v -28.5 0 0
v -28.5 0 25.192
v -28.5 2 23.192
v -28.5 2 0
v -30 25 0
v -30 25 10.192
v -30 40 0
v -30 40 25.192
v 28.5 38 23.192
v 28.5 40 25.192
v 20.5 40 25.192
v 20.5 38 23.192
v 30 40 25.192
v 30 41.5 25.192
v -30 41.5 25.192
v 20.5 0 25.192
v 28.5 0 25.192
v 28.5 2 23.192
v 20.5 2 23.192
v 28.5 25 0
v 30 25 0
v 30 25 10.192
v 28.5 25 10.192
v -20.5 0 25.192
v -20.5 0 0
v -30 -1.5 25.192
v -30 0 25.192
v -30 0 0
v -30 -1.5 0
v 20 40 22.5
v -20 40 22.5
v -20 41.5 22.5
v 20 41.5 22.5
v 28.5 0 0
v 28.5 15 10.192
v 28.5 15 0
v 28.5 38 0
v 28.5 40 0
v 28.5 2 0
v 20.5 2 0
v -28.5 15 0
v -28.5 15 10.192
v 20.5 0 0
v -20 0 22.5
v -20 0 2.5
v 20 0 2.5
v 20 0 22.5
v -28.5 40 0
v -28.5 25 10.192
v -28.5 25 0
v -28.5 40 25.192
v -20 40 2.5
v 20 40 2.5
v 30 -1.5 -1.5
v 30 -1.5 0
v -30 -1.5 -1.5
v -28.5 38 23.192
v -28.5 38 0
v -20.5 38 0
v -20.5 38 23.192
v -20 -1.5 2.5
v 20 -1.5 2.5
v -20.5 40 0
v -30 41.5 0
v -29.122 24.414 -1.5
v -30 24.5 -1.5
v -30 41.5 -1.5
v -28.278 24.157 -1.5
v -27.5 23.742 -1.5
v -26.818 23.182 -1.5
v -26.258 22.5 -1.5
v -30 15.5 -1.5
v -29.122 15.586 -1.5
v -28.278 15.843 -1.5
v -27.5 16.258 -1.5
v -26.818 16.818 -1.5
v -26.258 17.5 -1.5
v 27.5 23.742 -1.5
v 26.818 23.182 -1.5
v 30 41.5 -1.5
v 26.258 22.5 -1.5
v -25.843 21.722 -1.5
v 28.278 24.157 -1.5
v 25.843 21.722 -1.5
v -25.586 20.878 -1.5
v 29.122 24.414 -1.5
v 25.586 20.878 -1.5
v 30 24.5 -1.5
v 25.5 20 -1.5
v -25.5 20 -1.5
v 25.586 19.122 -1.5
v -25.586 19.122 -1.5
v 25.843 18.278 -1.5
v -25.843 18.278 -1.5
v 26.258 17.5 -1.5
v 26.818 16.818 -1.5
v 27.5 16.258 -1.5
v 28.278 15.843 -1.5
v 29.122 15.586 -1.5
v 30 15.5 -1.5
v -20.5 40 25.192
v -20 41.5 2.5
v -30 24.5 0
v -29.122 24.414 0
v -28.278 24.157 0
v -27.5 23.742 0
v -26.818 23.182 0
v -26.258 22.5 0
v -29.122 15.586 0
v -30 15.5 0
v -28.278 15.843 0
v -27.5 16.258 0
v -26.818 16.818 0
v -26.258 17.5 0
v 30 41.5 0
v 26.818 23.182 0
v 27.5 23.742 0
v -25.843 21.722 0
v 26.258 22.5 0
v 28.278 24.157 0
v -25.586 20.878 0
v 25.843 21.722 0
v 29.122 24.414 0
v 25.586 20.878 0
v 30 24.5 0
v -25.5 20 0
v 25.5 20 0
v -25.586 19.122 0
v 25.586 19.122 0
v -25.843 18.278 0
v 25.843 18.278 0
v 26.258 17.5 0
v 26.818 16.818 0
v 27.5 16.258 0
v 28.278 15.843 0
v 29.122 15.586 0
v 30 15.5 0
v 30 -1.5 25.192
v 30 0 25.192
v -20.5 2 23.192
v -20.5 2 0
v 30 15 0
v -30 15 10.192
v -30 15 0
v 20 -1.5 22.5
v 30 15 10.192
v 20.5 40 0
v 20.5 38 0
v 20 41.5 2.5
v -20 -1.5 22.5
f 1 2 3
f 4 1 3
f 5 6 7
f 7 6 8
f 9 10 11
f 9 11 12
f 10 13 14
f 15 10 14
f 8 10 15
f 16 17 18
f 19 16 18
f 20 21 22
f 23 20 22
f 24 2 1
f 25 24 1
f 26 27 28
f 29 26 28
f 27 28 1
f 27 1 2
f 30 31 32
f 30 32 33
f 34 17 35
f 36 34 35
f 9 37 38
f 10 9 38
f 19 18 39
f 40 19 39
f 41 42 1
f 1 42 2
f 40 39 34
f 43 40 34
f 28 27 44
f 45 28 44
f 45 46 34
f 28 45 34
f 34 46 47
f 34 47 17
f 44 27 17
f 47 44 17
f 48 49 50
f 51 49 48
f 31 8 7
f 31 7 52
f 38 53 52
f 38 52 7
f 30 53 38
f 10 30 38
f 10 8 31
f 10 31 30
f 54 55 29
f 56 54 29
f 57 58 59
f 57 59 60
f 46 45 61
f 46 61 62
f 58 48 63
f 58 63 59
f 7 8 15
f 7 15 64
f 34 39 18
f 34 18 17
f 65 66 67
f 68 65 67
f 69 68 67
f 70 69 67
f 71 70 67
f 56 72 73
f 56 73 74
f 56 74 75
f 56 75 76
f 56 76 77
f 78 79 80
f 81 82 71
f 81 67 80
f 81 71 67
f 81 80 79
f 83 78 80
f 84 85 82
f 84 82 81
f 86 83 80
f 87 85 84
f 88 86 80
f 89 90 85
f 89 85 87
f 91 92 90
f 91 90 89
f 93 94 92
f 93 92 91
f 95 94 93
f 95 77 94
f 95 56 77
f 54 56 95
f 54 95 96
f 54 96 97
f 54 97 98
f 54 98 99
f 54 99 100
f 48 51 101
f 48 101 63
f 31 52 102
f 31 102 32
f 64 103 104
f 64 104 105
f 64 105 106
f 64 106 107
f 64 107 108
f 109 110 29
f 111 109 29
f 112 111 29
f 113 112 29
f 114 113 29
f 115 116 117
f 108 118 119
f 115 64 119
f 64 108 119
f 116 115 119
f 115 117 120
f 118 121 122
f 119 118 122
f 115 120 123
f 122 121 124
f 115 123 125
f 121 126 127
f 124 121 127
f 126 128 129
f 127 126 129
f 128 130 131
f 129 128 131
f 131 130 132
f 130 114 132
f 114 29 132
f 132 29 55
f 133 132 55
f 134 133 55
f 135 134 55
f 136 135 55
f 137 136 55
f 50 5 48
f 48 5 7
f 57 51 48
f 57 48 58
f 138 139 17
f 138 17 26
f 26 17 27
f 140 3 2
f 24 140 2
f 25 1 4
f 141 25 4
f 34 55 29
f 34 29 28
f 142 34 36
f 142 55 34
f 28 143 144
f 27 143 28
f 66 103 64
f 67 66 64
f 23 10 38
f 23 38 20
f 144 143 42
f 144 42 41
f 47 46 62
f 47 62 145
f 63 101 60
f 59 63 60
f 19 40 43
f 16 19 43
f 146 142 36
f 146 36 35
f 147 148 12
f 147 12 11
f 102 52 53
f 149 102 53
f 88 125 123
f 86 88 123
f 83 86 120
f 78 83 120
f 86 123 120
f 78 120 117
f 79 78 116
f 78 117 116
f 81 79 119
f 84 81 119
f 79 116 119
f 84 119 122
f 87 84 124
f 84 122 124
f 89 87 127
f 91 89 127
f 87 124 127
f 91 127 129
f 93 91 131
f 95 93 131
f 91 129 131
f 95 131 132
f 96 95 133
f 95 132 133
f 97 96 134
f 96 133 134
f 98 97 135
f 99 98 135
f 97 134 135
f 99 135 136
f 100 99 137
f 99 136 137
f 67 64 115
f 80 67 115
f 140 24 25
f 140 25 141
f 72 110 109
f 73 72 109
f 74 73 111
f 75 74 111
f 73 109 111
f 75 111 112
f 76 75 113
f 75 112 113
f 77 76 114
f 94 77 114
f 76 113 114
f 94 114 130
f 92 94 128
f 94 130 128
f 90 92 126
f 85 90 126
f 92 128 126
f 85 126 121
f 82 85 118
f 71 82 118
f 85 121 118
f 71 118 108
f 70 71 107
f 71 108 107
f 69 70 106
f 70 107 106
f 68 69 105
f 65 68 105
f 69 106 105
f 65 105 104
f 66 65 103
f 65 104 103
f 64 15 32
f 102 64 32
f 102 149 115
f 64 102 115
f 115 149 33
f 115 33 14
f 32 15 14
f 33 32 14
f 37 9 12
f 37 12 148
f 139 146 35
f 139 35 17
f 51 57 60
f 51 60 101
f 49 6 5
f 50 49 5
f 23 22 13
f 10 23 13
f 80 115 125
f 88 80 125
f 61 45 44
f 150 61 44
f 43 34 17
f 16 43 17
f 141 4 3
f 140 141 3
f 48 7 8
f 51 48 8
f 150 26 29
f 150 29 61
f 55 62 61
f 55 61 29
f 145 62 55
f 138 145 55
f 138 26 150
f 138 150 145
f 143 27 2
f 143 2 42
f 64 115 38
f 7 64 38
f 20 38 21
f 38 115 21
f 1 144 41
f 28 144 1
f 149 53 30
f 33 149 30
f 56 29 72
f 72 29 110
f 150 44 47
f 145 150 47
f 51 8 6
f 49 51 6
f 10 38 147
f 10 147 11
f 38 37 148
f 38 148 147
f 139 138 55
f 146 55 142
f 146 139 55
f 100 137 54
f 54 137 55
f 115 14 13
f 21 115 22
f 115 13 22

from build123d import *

# Parameters (mm, degrees)
F0_W      = 40
F0_H      = 20
F1_DEPTH  = 1.5
F3_DEPTH  = 1.5
F5_DEPTH  = 1.5
F8_DEPTH  = 8
F10_DEPTH = 8
F13_DEPTH = 1.5


with BuildPart() as f1:
    # F0 (on Front) → F1 (new body)
    with BuildSketch(Plane.XZ):
        Polygon((-30, 0), (-25, 0), (-2.5, 0), (2.5, 0), (25, 0), (30, 0), (30, 15.191743), (30, 25.191743), (28.243897, 25.191743), (-28.487795, 25.191743), (-30, 25.191743), (-30, 15.191743), align=None)
        with Locations((0, 12.5)):
            Rectangle(F0_W, F0_H, mode=Mode.SUBTRACT)
    extrude(amount=F1_DEPTH)

    # F4 (on face) → F5 (join)
    with BuildSketch(Plane.YZ.offset(30)):
        Polygon((0, 25.191743), (0, 0), (15, 0), (15, 10.191743), align=None)
    extrude(amount=-F5_DEPTH)


with BuildPart() as f3:
    # F2 (on face) → F3 (new body)
    with BuildSketch(Plane(origin=(-30, 0, 0), x_dir=(0, -1, 0), z_dir=(-1, 0, 0))):
        Polygon((-15, 0), (0, 0), (0, 25.191743), (-15, 10.191743), align=None)
    extrude(amount=-F3_DEPTH)


with BuildPart() as f8:
    # F7 (on face) → F8 (new body)
    with BuildSketch(Plane.YZ.offset(-28.5)):
        Polygon((0, 25.191743), (0, 0), (1.999698, 0), (1.999698, 23.192045), align=None)
    extrude(amount=F8_DEPTH)


with BuildPart() as f10:
    # F9 (on face) → F10 (new body)
    with BuildSketch(Plane(origin=(28.5, 0, 0), x_dir=(0, -1, 0), z_dir=(-1, 0, 0))):
        Polygon((-2, 0), (0, 0), (0, 25.191743), (-2, 23.191743), align=None)
    extrude(amount=F10_DEPTH)


with BuildPart() as f11_1:
    # F11: instance of F1
    add(f1.part.mirror(Plane(origin=(-29.25, 20, 5.095871), x_dir=(-1, 0, 0), z_dir=(0, 1, 0))))


with BuildPart() as f11_2:
    # F11: instance of F8
    add(f8.part.mirror(Plane(origin=(-29.25, 20, 5.095871), x_dir=(-1, 0, 0), z_dir=(0, 1, 0))))


with BuildPart() as f11_3:
    # F11: instance of F3
    add(f3.part.mirror(Plane(origin=(-29.25, 20, 5.095871), x_dir=(-1, 0, 0), z_dir=(0, 1, 0))))


with BuildPart() as f11_4:
    # F11: instance of F10
    add(f10.part.mirror(Plane(origin=(-29.25, 20, 5.095871), x_dir=(-1, 0, 0), z_dir=(0, 1, 0))))


with BuildPart() as f13:
    # F12 (on face) → F13 (new body)
    with BuildSketch(Plane(origin=(0, 0, 0), x_dir=(1, 0, 0), z_dir=(0, 0, -1))):
        with BuildLine():
            Line((30, 1.5), (-30, 1.5))
            Line((-30, 1.5), (-30, -15.5))
            ThreePointArc((-30, -15.5), (-25.5, -20), (-30, -24.5))
            Line((-30, -24.5), (-30, -41.5))
            Line((-30, -41.5), (30, -41.5))
            Line((30, -41.5), (30, -24.5))
            ThreePointArc((30, -24.5), (25.5, -20), (30, -15.5))
            Line((30, -15.5), (30, 1.5))
        make_face()
    extrude(amount=F13_DEPTH)


solid = Compound([f1.part, f3.part, f8.part, f10.part, f11_1.part, f11_2.part, f11_3.part, f11_4.part, f13.part])
